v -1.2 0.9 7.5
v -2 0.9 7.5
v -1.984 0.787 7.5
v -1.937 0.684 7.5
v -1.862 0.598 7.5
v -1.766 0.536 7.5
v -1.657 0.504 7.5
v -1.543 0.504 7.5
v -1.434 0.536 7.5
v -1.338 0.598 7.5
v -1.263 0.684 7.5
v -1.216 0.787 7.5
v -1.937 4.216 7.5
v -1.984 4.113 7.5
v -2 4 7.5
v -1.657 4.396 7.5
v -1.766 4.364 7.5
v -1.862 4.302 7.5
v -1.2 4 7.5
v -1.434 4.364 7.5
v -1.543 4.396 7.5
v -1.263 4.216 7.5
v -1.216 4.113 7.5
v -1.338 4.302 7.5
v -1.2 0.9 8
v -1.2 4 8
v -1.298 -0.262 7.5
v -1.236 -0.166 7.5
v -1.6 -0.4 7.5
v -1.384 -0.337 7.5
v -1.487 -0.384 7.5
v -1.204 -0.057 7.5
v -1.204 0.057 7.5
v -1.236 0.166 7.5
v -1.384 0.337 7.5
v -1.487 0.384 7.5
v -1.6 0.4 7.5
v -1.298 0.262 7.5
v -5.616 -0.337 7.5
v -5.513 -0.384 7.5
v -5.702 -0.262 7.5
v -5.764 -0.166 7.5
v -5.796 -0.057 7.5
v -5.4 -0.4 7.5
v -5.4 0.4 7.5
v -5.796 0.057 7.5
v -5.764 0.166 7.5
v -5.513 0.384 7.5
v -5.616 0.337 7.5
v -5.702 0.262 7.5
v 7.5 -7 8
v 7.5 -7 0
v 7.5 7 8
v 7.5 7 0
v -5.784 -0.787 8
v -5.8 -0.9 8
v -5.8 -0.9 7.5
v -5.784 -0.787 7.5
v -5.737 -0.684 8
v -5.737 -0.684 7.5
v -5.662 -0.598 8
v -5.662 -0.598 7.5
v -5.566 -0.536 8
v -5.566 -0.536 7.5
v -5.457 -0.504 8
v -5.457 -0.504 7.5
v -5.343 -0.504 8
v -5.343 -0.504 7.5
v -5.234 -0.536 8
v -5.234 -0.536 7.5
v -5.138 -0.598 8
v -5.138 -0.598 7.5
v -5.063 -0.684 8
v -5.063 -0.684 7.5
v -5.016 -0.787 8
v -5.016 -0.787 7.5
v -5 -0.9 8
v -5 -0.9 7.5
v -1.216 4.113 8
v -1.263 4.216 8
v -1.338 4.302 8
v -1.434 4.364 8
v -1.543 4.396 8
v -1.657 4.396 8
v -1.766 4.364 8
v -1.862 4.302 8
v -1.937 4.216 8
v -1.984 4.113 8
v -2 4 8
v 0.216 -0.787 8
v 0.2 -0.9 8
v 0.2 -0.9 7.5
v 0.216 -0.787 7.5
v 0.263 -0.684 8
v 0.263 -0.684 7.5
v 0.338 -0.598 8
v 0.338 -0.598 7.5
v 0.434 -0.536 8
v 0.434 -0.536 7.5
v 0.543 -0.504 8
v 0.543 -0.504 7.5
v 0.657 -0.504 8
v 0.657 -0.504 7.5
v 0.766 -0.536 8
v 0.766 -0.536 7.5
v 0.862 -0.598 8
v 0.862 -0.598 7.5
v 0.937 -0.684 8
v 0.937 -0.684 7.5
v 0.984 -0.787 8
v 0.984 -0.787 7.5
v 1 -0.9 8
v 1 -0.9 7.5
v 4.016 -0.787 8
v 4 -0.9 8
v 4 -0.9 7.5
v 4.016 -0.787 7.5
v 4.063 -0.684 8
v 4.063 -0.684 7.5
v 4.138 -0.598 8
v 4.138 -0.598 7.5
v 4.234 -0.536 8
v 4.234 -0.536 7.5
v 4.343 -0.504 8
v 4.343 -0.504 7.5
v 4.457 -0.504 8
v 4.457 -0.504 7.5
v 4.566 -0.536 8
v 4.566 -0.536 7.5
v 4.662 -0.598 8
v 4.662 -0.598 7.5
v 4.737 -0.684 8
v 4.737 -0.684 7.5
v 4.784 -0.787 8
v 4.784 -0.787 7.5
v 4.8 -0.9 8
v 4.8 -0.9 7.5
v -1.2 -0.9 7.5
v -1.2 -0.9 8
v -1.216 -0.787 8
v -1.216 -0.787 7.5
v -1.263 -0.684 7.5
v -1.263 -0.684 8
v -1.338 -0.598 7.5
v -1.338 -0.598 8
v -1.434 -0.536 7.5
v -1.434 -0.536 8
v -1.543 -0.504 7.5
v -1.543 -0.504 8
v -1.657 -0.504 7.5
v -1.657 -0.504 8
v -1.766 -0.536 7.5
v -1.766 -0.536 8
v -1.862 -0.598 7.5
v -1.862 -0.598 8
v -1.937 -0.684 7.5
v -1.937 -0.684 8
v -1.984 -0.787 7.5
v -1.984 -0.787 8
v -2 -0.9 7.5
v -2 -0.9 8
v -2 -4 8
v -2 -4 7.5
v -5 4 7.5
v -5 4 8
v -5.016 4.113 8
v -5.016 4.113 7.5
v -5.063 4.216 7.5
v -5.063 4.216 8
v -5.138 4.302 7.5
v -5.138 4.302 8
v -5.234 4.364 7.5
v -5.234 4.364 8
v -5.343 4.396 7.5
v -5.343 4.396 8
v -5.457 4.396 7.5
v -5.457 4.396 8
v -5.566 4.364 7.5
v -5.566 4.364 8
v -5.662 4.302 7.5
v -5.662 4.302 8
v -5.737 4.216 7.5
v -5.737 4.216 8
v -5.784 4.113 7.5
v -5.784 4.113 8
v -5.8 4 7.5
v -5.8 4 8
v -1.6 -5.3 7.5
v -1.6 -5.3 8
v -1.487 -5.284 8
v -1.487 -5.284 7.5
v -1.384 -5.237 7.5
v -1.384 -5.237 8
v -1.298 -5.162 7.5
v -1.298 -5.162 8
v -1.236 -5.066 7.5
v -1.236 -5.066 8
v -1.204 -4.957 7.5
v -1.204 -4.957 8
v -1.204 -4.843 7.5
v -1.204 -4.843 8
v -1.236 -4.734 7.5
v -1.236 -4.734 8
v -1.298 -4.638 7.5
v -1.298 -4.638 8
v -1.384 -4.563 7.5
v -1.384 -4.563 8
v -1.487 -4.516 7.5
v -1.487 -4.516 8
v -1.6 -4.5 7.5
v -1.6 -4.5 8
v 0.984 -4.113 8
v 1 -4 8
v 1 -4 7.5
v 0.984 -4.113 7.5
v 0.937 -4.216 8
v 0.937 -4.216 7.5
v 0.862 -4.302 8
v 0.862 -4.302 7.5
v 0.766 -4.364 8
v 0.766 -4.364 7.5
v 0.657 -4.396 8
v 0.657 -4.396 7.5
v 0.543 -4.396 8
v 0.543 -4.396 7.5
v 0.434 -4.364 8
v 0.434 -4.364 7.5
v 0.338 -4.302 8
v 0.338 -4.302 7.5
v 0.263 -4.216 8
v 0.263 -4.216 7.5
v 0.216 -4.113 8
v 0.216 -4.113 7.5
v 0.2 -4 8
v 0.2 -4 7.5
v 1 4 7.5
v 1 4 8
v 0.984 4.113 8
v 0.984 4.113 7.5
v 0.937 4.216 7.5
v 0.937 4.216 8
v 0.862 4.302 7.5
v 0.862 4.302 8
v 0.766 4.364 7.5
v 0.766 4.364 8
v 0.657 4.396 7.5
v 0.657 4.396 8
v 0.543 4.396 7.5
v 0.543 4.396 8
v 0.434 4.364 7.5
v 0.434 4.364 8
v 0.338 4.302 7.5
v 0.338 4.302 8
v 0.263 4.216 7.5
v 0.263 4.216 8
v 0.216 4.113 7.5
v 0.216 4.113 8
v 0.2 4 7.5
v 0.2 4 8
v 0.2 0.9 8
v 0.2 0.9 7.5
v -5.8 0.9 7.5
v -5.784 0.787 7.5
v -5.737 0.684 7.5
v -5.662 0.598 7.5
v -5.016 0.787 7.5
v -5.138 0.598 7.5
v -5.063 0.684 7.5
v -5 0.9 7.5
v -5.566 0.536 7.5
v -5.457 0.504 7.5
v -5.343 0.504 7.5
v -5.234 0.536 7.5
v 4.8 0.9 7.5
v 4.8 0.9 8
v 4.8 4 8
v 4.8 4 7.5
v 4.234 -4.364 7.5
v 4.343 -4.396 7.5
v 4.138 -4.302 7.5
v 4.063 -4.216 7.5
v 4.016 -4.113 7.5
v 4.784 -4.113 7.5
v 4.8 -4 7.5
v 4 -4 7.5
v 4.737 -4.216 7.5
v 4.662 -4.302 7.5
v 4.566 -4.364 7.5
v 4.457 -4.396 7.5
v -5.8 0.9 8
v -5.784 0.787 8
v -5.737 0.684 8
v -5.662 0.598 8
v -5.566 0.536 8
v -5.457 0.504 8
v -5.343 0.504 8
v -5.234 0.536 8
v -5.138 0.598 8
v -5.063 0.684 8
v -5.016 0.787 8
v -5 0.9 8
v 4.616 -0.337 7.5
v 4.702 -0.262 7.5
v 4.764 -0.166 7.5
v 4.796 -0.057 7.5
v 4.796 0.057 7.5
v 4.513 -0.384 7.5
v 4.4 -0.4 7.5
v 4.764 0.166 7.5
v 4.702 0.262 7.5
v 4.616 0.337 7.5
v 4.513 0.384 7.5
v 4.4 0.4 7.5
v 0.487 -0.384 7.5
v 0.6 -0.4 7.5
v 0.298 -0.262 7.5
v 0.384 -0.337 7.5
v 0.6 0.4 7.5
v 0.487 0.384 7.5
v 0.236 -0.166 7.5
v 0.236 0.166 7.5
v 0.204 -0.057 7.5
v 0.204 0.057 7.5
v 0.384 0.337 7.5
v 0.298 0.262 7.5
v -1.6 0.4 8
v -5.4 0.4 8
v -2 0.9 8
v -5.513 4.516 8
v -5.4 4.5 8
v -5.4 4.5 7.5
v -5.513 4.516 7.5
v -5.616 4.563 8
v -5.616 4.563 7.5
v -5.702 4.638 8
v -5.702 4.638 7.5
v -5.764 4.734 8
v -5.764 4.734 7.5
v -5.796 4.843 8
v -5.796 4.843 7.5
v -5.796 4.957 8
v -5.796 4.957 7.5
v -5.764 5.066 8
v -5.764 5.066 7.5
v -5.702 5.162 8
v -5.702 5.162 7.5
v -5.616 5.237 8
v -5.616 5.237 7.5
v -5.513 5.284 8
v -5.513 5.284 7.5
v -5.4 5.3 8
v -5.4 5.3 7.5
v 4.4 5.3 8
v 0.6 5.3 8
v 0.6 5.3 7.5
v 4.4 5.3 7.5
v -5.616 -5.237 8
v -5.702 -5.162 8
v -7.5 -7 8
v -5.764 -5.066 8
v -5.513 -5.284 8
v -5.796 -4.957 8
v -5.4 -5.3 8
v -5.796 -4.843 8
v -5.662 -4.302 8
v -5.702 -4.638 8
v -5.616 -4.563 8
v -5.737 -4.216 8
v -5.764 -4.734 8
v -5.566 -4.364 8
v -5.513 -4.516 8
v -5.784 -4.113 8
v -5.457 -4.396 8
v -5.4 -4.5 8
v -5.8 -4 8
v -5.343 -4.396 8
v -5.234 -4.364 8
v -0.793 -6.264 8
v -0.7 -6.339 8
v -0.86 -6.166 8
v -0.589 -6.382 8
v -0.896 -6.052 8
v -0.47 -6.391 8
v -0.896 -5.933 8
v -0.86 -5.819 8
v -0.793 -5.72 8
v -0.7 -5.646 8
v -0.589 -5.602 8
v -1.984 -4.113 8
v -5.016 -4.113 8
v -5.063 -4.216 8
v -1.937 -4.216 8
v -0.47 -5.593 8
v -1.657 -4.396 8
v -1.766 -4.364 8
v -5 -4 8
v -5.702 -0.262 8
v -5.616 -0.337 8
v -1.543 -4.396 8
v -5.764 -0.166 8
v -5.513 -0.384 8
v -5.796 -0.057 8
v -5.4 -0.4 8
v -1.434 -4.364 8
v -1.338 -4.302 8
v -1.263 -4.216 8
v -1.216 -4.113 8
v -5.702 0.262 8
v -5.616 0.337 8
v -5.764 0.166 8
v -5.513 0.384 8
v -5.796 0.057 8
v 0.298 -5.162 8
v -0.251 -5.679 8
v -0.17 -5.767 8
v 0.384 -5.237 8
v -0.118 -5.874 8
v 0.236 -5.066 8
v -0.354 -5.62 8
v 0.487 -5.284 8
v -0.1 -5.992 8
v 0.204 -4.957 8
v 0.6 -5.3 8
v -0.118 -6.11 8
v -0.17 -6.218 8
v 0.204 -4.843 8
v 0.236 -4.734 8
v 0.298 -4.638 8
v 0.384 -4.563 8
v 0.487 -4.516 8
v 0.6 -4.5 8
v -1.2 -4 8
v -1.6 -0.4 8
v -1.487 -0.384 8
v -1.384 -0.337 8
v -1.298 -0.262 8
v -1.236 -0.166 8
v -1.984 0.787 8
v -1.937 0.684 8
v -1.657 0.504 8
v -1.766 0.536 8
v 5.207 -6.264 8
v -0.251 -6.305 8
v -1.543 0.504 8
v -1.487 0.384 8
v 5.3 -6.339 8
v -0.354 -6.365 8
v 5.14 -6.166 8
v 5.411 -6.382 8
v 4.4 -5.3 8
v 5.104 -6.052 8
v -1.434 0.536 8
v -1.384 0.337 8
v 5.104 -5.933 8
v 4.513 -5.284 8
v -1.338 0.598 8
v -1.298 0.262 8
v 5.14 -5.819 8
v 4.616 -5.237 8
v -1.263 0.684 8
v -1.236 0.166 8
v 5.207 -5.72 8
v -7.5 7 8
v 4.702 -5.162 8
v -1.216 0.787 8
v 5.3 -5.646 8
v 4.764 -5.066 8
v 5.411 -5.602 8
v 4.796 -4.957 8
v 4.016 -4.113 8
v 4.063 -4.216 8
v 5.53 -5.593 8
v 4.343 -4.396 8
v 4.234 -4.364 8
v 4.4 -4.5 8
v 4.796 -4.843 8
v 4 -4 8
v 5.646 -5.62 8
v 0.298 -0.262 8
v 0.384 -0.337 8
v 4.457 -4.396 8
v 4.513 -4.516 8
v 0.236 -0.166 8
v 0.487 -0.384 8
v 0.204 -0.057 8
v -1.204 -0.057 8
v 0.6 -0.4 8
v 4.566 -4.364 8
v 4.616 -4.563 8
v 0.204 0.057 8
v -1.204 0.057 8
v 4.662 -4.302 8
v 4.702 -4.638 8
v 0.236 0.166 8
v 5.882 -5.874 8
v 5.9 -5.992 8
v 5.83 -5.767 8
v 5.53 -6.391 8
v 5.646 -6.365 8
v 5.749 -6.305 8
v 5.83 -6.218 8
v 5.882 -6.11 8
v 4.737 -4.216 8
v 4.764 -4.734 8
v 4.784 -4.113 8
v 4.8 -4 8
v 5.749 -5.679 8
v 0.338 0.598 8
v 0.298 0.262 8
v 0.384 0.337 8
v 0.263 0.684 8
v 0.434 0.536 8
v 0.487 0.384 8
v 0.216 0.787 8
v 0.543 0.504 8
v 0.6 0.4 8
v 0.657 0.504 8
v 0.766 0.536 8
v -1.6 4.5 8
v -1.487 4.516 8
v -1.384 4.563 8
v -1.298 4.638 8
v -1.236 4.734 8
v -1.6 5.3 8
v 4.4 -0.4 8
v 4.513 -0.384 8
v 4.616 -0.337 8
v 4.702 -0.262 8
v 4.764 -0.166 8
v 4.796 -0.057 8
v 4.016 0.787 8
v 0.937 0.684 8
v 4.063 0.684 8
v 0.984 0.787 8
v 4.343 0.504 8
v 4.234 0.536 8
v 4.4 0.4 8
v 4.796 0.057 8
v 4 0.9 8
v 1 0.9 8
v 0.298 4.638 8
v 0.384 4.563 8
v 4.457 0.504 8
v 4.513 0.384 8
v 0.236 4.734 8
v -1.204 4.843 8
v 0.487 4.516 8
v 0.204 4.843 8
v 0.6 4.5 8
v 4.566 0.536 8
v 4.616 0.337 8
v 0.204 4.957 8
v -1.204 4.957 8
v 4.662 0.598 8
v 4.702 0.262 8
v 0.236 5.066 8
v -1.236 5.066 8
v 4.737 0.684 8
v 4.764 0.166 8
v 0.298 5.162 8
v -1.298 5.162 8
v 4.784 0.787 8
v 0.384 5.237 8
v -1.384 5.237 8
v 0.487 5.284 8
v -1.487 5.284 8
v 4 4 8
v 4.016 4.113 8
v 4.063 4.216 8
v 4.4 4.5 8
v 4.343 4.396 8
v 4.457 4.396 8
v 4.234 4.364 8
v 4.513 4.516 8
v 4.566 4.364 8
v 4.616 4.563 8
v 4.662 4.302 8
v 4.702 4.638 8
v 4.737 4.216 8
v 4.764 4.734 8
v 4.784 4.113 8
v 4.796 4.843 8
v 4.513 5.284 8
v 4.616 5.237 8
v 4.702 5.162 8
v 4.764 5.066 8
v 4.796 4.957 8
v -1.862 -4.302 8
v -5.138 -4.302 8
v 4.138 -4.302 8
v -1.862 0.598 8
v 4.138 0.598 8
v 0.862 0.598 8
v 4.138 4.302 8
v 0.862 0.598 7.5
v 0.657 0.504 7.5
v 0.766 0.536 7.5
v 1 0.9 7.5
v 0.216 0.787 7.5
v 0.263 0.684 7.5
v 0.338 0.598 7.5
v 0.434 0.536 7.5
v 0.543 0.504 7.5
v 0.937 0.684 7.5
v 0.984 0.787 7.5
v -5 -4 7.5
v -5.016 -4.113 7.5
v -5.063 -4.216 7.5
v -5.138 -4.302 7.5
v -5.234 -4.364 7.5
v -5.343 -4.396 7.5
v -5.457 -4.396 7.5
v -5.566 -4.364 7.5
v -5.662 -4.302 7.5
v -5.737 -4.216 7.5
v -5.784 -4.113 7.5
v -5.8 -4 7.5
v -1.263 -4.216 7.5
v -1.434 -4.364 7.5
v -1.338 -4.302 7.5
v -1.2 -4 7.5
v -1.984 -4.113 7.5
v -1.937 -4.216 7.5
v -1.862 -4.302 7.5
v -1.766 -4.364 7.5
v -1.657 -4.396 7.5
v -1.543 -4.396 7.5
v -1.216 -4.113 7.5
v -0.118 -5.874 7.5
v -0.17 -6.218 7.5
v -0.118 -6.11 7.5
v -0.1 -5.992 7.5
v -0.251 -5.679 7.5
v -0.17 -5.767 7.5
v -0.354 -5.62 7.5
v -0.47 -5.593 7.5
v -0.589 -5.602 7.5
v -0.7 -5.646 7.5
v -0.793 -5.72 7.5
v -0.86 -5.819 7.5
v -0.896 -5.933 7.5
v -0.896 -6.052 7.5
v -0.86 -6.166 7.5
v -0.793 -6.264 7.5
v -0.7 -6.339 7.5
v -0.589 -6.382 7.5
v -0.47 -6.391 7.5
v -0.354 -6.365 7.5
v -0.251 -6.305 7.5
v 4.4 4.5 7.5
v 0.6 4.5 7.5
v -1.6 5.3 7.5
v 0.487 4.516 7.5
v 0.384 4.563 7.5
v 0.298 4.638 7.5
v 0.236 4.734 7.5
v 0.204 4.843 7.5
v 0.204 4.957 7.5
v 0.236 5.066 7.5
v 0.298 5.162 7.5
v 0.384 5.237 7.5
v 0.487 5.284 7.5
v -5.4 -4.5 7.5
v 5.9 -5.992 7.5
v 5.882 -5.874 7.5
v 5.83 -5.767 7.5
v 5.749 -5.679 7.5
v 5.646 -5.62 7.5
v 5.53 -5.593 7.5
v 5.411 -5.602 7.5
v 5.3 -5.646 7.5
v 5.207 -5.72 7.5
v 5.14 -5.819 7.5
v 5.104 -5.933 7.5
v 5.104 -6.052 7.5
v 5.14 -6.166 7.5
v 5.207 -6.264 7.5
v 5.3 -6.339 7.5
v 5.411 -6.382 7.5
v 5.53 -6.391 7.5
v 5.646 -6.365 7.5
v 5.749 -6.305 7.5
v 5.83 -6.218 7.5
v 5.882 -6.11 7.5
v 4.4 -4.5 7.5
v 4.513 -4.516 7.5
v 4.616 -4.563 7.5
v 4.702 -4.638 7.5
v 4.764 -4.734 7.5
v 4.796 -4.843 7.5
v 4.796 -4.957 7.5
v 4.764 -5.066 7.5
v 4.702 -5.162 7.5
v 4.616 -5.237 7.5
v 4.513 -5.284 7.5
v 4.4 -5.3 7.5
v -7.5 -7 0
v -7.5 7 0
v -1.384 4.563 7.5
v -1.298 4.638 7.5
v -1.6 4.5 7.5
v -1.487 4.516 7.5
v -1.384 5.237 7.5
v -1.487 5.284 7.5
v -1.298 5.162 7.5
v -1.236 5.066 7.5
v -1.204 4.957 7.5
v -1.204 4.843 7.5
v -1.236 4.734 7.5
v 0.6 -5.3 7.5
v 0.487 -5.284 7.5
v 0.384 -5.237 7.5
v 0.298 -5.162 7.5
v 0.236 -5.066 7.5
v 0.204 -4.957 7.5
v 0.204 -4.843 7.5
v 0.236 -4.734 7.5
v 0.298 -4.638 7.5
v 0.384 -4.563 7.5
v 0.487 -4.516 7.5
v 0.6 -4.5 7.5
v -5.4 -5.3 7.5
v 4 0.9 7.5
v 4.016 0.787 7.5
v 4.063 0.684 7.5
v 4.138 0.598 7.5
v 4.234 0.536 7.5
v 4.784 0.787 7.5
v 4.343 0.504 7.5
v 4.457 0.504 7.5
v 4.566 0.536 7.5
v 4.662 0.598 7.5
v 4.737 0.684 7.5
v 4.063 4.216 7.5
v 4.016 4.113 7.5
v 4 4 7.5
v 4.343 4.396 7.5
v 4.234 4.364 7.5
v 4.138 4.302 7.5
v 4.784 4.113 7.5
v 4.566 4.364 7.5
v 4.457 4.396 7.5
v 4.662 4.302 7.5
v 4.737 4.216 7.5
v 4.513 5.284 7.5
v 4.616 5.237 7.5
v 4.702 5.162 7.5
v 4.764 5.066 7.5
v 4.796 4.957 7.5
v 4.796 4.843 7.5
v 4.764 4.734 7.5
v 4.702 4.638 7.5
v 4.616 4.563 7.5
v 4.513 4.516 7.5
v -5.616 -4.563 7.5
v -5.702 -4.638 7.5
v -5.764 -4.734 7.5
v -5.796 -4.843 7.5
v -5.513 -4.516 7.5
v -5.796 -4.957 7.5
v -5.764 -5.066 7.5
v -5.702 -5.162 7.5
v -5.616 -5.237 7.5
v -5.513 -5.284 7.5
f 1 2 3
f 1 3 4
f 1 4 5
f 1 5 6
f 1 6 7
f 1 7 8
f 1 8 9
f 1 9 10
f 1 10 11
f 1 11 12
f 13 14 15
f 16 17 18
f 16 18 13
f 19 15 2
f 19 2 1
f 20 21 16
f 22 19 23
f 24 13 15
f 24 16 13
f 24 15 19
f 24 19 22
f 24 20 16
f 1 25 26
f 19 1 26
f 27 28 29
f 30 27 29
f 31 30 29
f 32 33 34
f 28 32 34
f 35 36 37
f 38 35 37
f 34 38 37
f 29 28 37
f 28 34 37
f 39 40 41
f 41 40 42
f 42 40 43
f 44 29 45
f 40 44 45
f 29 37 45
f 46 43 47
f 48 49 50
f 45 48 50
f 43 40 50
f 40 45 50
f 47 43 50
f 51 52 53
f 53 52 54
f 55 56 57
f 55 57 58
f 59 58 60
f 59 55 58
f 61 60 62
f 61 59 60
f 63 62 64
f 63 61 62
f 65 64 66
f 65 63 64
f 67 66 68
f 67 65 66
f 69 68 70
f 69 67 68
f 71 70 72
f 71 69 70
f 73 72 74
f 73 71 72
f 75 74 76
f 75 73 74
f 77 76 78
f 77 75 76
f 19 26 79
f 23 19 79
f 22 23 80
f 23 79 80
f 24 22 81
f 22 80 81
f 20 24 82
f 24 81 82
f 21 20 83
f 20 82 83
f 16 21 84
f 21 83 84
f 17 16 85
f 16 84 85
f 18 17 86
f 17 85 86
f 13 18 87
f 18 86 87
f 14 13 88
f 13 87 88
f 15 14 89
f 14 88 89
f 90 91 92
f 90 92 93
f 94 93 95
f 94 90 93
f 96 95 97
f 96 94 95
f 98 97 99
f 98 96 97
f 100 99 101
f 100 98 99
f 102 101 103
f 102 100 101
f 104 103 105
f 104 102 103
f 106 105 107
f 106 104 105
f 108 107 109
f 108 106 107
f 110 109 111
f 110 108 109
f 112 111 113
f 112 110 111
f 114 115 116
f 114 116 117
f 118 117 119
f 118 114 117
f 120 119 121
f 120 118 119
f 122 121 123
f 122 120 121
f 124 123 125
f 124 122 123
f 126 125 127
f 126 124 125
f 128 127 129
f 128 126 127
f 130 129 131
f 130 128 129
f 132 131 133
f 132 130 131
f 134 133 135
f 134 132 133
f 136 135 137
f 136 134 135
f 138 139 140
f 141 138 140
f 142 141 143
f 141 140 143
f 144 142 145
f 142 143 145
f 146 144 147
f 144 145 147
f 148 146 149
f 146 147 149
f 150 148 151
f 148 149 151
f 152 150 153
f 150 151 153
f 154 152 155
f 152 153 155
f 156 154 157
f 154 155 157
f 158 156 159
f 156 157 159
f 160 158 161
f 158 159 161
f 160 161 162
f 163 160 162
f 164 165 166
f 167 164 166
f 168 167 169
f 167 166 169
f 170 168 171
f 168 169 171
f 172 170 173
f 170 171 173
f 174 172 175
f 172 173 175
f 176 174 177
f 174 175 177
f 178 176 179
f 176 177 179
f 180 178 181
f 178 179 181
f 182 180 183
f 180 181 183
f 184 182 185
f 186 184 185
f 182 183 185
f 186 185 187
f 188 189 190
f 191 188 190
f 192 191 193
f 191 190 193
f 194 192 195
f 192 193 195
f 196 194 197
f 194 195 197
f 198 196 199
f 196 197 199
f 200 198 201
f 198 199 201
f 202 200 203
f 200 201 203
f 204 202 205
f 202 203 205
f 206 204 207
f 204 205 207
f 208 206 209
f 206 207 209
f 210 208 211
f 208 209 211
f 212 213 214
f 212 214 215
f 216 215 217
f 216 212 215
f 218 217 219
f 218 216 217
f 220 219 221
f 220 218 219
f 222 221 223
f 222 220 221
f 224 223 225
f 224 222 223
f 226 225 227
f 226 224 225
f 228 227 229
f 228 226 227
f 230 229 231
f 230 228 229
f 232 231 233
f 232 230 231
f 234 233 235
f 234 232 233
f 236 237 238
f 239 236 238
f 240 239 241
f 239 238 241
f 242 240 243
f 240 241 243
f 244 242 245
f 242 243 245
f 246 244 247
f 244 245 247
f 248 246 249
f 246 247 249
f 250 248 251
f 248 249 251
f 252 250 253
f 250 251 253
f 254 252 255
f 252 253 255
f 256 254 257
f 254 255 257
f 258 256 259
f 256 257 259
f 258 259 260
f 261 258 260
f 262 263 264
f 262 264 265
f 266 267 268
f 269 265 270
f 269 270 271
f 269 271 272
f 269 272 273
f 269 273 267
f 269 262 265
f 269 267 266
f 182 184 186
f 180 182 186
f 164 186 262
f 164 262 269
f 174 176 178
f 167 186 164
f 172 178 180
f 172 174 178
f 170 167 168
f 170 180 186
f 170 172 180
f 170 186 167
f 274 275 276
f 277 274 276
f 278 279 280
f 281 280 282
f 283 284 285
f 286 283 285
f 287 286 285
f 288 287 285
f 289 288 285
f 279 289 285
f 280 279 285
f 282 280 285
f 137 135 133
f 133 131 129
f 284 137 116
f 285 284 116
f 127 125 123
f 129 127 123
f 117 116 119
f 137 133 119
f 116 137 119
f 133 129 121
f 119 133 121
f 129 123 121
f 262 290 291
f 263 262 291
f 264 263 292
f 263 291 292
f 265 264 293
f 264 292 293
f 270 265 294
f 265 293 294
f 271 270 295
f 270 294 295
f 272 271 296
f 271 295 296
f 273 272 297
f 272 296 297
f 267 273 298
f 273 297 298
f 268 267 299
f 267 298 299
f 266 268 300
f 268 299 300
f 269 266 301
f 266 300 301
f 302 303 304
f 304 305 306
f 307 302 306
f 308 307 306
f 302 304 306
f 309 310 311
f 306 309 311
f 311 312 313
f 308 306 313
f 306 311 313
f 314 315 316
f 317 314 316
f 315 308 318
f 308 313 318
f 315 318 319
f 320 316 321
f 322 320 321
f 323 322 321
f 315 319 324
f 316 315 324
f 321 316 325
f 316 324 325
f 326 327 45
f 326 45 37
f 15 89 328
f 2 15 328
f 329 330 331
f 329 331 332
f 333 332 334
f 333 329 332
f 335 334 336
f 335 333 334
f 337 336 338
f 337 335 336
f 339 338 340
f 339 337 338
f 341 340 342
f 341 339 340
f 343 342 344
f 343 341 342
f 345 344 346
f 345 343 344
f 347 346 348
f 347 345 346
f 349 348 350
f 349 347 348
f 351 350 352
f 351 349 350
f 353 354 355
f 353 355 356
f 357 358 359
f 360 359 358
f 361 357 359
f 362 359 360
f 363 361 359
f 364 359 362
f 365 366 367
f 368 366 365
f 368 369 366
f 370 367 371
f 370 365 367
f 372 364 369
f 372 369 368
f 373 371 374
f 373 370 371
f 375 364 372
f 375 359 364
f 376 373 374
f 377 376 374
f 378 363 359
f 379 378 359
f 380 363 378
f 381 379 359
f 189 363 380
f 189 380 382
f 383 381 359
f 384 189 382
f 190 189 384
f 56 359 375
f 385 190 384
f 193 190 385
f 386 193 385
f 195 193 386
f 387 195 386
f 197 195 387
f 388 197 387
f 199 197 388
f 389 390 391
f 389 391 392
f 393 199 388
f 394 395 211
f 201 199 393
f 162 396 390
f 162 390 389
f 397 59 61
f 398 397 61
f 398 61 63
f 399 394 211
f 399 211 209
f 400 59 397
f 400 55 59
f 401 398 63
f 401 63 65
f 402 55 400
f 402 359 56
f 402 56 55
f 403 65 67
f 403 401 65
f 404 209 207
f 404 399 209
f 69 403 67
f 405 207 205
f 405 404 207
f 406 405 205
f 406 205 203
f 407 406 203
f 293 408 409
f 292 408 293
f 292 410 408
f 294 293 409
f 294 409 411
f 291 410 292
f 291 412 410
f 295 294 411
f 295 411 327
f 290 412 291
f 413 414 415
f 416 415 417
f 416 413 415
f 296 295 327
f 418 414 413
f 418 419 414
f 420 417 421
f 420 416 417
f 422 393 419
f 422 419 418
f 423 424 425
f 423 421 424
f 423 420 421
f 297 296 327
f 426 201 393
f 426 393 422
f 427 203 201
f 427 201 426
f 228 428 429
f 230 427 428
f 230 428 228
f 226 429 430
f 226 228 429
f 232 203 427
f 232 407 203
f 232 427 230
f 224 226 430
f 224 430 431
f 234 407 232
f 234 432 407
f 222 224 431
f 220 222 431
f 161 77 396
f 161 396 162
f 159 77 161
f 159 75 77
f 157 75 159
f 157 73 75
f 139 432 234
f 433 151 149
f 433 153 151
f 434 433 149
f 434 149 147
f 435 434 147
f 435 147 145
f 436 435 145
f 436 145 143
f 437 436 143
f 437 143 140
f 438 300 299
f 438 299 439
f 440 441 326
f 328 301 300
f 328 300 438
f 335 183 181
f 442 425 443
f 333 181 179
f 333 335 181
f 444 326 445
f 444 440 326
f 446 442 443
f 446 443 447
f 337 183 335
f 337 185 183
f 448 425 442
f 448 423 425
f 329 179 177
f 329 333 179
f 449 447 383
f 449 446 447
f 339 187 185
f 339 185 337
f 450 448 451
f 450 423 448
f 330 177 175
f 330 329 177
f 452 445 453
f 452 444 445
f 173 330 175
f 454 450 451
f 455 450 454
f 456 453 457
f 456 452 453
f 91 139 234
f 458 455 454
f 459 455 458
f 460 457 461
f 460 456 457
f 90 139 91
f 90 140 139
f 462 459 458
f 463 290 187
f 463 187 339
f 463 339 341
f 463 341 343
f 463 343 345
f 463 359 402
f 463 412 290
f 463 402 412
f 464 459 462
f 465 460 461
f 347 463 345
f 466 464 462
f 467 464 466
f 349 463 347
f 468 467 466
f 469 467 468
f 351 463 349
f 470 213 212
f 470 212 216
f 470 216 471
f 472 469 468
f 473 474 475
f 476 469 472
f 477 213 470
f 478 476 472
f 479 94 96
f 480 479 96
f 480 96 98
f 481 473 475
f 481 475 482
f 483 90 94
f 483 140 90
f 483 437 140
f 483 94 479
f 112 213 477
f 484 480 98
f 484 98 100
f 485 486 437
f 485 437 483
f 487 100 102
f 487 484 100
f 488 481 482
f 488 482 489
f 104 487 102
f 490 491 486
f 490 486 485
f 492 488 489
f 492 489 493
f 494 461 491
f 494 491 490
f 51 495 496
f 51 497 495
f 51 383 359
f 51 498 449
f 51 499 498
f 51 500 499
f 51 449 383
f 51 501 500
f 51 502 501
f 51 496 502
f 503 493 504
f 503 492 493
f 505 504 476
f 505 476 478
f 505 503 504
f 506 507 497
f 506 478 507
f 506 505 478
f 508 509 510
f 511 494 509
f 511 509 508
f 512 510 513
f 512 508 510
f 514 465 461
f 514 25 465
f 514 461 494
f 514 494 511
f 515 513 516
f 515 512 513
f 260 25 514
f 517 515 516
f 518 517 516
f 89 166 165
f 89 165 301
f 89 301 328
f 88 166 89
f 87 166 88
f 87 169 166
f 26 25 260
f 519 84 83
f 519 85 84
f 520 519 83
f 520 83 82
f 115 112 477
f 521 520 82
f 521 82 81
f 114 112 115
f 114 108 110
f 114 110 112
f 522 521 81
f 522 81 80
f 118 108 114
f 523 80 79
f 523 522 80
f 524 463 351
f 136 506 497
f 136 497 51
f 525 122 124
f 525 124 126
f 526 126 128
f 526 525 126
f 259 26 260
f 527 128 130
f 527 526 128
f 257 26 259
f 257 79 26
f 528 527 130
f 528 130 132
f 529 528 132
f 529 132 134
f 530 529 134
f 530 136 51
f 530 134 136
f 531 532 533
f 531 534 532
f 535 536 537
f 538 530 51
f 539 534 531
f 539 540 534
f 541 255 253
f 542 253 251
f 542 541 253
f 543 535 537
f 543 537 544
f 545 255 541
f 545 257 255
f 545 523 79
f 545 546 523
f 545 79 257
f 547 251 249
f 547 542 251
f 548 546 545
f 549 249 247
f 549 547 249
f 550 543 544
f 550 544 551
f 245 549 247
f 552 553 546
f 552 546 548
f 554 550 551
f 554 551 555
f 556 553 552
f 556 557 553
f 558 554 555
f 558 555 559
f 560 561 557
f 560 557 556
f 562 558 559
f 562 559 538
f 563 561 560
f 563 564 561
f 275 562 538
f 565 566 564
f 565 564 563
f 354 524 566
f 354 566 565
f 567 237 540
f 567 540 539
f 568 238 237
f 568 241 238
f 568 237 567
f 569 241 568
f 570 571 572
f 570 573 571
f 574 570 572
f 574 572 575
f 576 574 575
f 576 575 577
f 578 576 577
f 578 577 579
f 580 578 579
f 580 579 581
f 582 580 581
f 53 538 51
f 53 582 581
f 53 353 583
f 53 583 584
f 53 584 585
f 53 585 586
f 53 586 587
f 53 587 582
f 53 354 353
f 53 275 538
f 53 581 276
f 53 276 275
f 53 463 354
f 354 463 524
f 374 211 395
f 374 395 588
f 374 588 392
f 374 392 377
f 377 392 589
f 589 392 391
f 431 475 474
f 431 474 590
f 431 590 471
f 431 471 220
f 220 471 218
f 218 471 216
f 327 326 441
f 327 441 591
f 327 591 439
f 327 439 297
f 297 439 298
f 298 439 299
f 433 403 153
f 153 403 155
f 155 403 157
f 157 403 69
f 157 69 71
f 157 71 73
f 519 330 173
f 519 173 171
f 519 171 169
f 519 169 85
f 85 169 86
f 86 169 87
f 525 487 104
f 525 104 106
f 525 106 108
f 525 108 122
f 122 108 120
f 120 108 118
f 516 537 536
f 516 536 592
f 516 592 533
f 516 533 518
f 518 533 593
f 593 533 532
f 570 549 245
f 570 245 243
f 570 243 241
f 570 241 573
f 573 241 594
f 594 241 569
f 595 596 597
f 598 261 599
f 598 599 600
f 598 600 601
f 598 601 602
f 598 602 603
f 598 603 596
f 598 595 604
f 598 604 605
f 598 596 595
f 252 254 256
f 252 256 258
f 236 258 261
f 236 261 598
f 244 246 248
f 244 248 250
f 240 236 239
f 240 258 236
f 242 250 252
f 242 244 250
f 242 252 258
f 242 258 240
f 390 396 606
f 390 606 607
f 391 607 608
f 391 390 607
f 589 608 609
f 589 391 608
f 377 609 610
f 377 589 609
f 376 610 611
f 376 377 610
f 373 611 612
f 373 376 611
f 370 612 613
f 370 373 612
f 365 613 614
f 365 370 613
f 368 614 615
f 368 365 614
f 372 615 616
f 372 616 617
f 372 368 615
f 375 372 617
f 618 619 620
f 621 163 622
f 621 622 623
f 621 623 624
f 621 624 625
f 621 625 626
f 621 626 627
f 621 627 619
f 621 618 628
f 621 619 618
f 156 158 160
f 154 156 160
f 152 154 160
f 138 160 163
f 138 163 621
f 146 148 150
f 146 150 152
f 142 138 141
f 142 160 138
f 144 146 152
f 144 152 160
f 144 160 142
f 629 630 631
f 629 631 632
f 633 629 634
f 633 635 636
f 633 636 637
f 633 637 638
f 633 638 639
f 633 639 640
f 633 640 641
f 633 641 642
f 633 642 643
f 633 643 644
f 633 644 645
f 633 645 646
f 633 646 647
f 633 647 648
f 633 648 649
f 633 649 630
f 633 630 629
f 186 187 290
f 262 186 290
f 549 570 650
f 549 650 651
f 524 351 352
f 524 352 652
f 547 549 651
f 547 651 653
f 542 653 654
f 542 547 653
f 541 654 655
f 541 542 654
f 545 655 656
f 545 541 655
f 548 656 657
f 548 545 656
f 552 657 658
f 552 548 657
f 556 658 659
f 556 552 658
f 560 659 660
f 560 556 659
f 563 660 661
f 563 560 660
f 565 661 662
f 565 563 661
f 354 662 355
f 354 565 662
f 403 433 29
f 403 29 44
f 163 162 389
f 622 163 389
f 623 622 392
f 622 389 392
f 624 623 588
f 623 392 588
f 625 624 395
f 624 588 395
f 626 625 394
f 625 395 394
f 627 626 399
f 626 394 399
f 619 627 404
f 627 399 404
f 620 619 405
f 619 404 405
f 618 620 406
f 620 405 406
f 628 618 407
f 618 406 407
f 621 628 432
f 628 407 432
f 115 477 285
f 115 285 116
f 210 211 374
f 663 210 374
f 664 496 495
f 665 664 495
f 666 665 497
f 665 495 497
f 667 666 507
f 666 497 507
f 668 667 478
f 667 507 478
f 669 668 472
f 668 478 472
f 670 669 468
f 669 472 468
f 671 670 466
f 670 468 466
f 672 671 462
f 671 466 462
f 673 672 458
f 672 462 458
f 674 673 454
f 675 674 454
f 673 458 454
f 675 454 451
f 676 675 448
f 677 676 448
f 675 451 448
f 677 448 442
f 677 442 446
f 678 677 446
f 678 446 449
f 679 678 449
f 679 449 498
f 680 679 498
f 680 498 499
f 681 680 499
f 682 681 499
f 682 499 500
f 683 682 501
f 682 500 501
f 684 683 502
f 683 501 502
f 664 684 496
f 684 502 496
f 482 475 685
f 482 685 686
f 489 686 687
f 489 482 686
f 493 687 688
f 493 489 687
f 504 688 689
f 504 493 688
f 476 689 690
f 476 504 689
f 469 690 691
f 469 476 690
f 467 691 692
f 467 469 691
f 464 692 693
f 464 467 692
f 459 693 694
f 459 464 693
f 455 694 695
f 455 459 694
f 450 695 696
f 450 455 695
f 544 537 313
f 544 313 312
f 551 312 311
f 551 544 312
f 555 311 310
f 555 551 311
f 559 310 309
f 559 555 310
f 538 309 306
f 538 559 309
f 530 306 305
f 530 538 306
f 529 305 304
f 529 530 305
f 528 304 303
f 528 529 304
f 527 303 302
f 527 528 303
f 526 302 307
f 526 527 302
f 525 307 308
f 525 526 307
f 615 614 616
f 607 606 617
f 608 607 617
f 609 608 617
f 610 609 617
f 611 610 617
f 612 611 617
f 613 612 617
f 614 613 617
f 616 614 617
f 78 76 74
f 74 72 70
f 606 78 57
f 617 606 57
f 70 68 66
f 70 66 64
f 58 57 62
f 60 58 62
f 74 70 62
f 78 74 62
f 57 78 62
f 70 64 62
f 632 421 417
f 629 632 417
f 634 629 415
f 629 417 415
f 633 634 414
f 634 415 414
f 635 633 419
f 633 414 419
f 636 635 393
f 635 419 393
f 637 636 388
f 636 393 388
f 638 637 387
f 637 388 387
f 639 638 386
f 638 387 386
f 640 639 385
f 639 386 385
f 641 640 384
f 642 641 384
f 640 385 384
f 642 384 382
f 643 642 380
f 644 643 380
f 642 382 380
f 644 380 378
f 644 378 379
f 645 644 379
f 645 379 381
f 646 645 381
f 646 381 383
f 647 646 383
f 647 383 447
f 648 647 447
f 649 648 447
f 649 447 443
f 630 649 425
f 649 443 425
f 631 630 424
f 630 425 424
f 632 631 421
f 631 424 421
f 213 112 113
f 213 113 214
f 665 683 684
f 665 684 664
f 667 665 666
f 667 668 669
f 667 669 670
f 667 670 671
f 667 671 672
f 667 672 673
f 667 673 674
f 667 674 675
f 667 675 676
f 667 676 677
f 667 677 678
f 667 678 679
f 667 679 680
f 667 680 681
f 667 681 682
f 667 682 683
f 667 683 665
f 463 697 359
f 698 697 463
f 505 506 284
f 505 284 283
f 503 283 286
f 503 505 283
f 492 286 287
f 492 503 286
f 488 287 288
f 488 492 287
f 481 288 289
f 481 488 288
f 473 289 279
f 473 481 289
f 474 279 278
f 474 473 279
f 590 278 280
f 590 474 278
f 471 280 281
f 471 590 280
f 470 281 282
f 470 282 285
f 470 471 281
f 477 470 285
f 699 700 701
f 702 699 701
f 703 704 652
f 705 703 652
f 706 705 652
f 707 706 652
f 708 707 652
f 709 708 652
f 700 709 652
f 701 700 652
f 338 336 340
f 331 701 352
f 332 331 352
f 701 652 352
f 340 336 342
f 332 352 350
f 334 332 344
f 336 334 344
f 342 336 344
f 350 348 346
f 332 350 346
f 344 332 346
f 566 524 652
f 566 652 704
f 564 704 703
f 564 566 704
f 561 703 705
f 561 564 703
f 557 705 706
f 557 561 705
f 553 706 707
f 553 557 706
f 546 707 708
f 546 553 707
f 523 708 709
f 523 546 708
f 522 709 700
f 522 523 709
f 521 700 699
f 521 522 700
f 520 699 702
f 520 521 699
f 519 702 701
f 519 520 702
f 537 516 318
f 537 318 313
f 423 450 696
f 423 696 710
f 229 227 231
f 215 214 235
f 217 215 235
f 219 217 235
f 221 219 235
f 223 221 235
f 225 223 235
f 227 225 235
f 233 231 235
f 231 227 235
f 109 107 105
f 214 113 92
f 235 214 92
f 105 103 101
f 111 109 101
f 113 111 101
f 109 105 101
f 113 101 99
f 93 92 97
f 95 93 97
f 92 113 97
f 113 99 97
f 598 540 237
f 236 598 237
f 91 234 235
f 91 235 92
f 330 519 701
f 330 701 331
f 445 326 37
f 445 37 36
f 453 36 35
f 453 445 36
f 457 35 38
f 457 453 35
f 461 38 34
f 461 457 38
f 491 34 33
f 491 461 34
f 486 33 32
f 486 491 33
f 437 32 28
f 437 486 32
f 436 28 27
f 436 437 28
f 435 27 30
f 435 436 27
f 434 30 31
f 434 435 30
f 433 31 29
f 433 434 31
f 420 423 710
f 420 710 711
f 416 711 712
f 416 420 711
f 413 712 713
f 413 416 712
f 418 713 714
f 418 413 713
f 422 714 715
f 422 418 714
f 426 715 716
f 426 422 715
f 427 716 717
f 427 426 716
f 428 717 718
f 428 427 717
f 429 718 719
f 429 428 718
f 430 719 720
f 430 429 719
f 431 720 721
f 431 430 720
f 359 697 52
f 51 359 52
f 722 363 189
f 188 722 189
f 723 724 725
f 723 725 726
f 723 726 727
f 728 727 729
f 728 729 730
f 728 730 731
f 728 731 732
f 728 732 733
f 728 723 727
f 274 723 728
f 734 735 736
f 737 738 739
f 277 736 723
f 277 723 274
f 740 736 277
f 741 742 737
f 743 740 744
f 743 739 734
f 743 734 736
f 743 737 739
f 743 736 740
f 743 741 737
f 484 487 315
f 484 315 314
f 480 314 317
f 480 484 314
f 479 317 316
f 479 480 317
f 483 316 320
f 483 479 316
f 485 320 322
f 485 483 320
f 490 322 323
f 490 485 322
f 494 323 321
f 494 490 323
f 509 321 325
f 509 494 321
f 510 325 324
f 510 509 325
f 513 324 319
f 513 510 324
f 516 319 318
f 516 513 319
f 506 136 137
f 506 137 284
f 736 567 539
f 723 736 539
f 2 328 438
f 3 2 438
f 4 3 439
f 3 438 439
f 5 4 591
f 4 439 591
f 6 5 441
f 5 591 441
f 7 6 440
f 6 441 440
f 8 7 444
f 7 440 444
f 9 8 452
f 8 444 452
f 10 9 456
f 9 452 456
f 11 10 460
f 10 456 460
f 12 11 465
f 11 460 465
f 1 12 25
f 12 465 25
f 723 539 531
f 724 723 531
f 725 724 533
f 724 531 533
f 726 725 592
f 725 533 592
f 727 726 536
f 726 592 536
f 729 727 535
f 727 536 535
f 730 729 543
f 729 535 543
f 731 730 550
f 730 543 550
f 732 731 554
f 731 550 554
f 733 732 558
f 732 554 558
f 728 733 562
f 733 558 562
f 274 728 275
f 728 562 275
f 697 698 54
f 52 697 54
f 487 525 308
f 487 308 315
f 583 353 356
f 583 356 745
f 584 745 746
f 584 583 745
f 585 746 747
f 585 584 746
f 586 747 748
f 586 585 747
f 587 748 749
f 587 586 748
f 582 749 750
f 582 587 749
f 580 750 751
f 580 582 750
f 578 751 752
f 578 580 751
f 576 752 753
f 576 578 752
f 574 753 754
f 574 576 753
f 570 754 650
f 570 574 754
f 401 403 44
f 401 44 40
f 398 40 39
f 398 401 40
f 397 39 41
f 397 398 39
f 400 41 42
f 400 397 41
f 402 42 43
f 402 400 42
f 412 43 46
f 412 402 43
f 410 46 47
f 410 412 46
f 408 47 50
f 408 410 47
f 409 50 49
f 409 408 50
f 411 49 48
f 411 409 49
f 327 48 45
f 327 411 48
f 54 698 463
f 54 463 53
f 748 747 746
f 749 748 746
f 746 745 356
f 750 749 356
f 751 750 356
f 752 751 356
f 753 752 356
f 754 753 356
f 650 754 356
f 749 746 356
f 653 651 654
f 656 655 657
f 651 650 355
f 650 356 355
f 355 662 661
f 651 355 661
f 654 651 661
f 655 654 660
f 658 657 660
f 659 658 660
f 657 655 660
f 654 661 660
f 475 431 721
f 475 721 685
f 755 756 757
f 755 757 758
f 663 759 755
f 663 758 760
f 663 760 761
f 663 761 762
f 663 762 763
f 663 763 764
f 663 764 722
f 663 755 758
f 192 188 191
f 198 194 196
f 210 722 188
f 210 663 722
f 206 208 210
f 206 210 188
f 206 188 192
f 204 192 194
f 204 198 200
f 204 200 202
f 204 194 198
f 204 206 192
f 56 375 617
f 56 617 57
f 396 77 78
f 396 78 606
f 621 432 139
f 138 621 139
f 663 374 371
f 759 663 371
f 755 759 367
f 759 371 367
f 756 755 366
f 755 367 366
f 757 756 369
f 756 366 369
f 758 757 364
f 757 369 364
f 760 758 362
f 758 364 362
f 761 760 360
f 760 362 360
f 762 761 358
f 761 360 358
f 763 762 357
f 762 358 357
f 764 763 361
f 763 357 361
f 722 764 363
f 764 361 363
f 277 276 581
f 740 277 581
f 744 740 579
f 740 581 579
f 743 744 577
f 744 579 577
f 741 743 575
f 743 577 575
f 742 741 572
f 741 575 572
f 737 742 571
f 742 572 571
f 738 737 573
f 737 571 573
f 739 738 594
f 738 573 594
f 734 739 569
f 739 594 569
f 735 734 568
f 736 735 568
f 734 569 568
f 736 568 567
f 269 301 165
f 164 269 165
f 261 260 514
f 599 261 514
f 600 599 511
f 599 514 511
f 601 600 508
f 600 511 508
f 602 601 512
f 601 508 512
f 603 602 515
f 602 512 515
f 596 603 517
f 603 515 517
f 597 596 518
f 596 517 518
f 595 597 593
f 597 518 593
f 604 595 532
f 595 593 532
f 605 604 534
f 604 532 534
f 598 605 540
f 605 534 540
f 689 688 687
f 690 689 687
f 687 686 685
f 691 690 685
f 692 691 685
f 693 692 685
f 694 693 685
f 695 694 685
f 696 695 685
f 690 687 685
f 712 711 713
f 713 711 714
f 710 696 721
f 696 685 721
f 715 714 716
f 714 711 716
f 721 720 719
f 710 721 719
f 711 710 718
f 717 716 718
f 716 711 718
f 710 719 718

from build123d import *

# Parameters (mm, degrees)
SKETCH_1_W          = 15
SKETCH_1_H          = 14
EXTRUDE_1_DEPTH     = 8
SKETCH_2_R          = 0.4
CUT_EXTRUDE_1_DEPTH = 0.5


with BuildPart() as part:
    # 草图1 → 凸台-拉伸1 (new body)
    with BuildSketch(Plane.XY):
        Rectangle(SKETCH_1_W, SKETCH_1_H)
    extrude(amount=EXTRUDE_1_DEPTH)

    # 草图2 → 切除-拉伸1 (cut)
    with BuildSketch(Plane.XY.offset(8)):
        with Locations((-0.5, -5.99218047)):
            Circle(SKETCH_2_R)
        with Locations((5.5, -5.99218047)):
            Circle(SKETCH_2_R)
        with BuildLine():
            Line((-5.4, 5.3), (-1.6, 5.3))
            ThreePointArc((-1.6, 5.3), (-1.2, 4.9), (-1.6, 4.5))
            Line((-1.6, 4.5), (-5.4, 4.5))
            ThreePointArc((-5.4, 4.5), (-5.8, 4.9), (-5.4, 5.3))
        make_face()
        with BuildLine():
            Line((-5.4, -5.3), (-1.6, -5.3))
            ThreePointArc((-1.6, -5.3), (-1.2, -4.9), (-1.6, -4.5))
            Line((-1.6, -4.5), (-5.4, -4.5))
            ThreePointArc((-5.4, -4.5), (-5.8, -4.9), (-5.4, -5.3))
        make_face()
        with BuildLine():
            Line((-5.8, 4), (-5.8, 0.9))
            ThreePointArc((-5.8, 0.9), (-5.4, 0.5), (-5, 0.9))
            Line((-5, 0.9), (-5, 4))
            ThreePointArc((-5, 4), (-5.4, 4.4), (-5.8, 4))
        make_face()
        with BuildLine():
            Line((-2, 4), (-2, 0.9))
            ThreePointArc((-2, 0.9), (-1.6, 0.5), (-1.2, 0.9))
            Line((-1.2, 0.9), (-1.2, 4))
            ThreePointArc((-1.2, 4), (-1.6, 4.4), (-2, 4))
        make_face()
        with BuildLine():
            Line((-1.2, -4), (-1.2, -0.9))
            ThreePointArc((-1.2, -0.9), (-1.6, -0.5), (-2, -0.9))
            Line((-2, -0.9), (-2, -4))
            ThreePointArc((-2, -4), (-1.6, -4.4), (-1.2, -4))
        make_face()
        with BuildLine():
            Line((-5.8, -4), (-5.8, -0.9))
            ThreePointArc((-5.8, -0.9), (-5.4, -0.5), (-5, -0.9))
            Line((-5, -0.9), (-5, -4))
            ThreePointArc((-5, -4), (-5.4, -4.4), (-5.8, -4))
        make_face()
        with BuildLine():
            Line((-5.4, 0.4), (-1.6, 0.4))
            ThreePointArc((-1.6, 0.4), (-1.2, 0), (-1.6, -0.4))
            Line((-1.6, -0.4), (-5.4, -0.4))
            ThreePointArc((-5.4, -0.4), (-5.8, 0), (-5.4, 0.4))
        make_face()
        with BuildLine():
            Line((4.4, -5.3), (0.6, -5.3))
            ThreePointArc((0.6, -5.3), (0.2, -4.9), (0.6, -4.5))
            Line((0.6, -4.5), (4.4, -4.5))
            ThreePointArc((4.4, -4.5), (4.8, -4.9), (4.4, -5.3))
        make_face()
        with BuildLine():
            Line((0.2, -4), (0.2, -0.9))
            ThreePointArc((0.2, -0.9), (0.6, -0.5), (1, -0.9))
            Line((1, -0.9), (1, -4))
            ThreePointArc((1, -4), (0.6, -4.4), (0.2, -4))
        make_face()
        with BuildLine():
            Line((4, -4), (4, -0.9))
            ThreePointArc((4, -0.9), (4.4, -0.5), (4.8, -0.9))
            Line((4.8, -0.9), (4.8, -4))
            ThreePointArc((4.8, -4), (4.4, -4.4), (4, -4))
        make_face()
        with BuildLine():
            Line((4.4, -0.4), (0.6, -0.4))
            ThreePointArc((0.6, -0.4), (0.2, 0), (0.6, 0.4))
            Line((0.6, 0.4), (4.4, 0.4))
            ThreePointArc((4.4, 0.4), (4.8, 0), (4.4, -0.4))
        make_face()
        with BuildLine():
            Line((0.2, 4), (0.2, 0.9))
            ThreePointArc((0.2, 0.9), (0.6, 0.5), (1, 0.9))
            Line((1, 0.9), (1, 4))
            ThreePointArc((1, 4), (0.6, 4.4), (0.2, 4))
        make_face()
        with BuildLine():
            Line((4.4, 4.5), (0.6, 4.5))
            ThreePointArc((0.6, 4.5), (0.2, 4.9), (0.6, 5.3))
            Line((0.6, 5.3), (4.4, 5.3))
            ThreePointArc((4.4, 5.3), (4.8, 4.9), (4.4, 4.5))
        make_face()
        with BuildLine():
            Line((4, 4), (4, 0.9))
            ThreePointArc((4, 0.9), (4.4, 0.5), (4.8, 0.9))
            Line((4.8, 0.9), (4.8, 4))
            ThreePointArc((4.8, 4), (4.4, 4.4), (4, 4))
        make_face()
    extrude(amount=-CUT_EXTRUDE_1_DEPTH, mode=Mode.SUBTRACT)


solid = part.part
